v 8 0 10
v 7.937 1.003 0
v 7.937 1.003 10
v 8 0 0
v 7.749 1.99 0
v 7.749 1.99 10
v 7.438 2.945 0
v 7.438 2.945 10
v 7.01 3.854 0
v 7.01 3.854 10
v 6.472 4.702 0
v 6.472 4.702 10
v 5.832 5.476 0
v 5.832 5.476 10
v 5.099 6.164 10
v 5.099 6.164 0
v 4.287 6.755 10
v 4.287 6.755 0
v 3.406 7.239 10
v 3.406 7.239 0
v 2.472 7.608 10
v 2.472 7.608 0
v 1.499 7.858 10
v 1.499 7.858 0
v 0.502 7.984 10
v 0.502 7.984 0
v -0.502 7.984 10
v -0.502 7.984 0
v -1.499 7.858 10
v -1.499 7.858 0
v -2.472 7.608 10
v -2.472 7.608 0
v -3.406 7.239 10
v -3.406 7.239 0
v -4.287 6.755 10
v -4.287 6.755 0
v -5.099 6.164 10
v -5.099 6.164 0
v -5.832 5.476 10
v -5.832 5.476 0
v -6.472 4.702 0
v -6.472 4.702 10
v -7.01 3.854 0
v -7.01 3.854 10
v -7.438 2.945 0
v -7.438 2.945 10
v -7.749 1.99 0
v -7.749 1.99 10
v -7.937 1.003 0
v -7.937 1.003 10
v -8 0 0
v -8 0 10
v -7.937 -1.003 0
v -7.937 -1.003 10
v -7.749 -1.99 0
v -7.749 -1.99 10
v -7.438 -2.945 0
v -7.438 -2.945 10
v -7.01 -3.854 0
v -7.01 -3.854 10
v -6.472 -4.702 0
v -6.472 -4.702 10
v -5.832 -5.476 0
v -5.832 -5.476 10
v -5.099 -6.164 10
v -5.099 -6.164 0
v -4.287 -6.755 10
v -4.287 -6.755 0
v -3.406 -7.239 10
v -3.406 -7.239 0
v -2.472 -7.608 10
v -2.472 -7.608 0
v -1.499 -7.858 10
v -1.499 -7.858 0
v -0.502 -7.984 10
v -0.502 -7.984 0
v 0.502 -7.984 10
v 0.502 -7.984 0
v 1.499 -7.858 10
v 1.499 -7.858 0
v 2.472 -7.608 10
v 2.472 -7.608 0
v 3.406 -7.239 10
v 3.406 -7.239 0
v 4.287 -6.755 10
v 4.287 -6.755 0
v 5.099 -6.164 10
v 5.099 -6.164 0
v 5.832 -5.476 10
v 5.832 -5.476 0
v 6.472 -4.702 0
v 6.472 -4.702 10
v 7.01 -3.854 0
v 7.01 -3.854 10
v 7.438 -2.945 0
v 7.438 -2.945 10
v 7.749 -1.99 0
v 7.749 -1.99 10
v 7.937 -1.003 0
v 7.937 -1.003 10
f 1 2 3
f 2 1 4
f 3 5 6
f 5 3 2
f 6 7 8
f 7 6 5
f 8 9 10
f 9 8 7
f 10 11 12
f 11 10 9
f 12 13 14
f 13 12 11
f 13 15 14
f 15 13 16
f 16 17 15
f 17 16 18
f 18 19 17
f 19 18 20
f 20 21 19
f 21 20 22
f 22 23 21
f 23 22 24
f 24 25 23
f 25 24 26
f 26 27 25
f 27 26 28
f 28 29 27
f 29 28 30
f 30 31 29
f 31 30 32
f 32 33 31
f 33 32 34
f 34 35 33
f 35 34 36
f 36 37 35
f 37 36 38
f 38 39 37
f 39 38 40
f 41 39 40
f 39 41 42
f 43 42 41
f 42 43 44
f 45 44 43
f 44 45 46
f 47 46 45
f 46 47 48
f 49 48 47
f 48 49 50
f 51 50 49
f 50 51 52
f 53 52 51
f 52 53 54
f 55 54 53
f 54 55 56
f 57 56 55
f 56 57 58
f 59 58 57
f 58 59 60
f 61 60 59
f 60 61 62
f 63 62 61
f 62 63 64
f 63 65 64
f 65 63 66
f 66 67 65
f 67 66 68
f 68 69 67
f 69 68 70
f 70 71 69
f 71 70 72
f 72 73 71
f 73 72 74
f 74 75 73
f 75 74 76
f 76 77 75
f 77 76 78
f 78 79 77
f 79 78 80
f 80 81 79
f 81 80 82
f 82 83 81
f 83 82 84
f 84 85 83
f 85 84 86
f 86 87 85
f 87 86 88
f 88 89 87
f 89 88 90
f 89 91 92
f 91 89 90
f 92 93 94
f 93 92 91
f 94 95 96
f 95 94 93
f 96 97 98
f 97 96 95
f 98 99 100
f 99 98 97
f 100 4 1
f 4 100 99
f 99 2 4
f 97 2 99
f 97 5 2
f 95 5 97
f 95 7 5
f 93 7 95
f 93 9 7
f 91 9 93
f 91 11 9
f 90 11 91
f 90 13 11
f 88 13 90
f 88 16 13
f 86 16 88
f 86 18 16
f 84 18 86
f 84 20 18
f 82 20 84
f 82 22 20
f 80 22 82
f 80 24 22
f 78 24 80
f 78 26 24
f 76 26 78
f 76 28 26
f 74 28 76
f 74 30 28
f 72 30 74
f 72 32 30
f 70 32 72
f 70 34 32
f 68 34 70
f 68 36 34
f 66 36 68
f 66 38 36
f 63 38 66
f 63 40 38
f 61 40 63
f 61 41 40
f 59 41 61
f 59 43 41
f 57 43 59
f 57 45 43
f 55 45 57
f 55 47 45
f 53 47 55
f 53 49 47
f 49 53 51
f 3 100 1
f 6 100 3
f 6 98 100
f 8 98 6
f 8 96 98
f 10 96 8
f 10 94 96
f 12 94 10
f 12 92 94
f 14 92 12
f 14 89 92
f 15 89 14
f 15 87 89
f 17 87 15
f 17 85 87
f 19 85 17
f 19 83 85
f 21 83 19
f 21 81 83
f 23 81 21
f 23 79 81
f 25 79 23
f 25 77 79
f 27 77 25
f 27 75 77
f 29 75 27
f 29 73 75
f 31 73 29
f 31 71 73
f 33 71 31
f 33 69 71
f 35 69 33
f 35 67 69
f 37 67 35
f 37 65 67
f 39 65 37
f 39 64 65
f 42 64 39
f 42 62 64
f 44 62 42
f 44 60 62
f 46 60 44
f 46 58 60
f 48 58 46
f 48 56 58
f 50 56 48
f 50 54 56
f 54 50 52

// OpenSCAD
{
    r = 8;
    cylinder(h=10, r1=r, r2=r, $fn=50);
    cylinder(h=0, r1=r, r2=r, $fn=50);    
}
